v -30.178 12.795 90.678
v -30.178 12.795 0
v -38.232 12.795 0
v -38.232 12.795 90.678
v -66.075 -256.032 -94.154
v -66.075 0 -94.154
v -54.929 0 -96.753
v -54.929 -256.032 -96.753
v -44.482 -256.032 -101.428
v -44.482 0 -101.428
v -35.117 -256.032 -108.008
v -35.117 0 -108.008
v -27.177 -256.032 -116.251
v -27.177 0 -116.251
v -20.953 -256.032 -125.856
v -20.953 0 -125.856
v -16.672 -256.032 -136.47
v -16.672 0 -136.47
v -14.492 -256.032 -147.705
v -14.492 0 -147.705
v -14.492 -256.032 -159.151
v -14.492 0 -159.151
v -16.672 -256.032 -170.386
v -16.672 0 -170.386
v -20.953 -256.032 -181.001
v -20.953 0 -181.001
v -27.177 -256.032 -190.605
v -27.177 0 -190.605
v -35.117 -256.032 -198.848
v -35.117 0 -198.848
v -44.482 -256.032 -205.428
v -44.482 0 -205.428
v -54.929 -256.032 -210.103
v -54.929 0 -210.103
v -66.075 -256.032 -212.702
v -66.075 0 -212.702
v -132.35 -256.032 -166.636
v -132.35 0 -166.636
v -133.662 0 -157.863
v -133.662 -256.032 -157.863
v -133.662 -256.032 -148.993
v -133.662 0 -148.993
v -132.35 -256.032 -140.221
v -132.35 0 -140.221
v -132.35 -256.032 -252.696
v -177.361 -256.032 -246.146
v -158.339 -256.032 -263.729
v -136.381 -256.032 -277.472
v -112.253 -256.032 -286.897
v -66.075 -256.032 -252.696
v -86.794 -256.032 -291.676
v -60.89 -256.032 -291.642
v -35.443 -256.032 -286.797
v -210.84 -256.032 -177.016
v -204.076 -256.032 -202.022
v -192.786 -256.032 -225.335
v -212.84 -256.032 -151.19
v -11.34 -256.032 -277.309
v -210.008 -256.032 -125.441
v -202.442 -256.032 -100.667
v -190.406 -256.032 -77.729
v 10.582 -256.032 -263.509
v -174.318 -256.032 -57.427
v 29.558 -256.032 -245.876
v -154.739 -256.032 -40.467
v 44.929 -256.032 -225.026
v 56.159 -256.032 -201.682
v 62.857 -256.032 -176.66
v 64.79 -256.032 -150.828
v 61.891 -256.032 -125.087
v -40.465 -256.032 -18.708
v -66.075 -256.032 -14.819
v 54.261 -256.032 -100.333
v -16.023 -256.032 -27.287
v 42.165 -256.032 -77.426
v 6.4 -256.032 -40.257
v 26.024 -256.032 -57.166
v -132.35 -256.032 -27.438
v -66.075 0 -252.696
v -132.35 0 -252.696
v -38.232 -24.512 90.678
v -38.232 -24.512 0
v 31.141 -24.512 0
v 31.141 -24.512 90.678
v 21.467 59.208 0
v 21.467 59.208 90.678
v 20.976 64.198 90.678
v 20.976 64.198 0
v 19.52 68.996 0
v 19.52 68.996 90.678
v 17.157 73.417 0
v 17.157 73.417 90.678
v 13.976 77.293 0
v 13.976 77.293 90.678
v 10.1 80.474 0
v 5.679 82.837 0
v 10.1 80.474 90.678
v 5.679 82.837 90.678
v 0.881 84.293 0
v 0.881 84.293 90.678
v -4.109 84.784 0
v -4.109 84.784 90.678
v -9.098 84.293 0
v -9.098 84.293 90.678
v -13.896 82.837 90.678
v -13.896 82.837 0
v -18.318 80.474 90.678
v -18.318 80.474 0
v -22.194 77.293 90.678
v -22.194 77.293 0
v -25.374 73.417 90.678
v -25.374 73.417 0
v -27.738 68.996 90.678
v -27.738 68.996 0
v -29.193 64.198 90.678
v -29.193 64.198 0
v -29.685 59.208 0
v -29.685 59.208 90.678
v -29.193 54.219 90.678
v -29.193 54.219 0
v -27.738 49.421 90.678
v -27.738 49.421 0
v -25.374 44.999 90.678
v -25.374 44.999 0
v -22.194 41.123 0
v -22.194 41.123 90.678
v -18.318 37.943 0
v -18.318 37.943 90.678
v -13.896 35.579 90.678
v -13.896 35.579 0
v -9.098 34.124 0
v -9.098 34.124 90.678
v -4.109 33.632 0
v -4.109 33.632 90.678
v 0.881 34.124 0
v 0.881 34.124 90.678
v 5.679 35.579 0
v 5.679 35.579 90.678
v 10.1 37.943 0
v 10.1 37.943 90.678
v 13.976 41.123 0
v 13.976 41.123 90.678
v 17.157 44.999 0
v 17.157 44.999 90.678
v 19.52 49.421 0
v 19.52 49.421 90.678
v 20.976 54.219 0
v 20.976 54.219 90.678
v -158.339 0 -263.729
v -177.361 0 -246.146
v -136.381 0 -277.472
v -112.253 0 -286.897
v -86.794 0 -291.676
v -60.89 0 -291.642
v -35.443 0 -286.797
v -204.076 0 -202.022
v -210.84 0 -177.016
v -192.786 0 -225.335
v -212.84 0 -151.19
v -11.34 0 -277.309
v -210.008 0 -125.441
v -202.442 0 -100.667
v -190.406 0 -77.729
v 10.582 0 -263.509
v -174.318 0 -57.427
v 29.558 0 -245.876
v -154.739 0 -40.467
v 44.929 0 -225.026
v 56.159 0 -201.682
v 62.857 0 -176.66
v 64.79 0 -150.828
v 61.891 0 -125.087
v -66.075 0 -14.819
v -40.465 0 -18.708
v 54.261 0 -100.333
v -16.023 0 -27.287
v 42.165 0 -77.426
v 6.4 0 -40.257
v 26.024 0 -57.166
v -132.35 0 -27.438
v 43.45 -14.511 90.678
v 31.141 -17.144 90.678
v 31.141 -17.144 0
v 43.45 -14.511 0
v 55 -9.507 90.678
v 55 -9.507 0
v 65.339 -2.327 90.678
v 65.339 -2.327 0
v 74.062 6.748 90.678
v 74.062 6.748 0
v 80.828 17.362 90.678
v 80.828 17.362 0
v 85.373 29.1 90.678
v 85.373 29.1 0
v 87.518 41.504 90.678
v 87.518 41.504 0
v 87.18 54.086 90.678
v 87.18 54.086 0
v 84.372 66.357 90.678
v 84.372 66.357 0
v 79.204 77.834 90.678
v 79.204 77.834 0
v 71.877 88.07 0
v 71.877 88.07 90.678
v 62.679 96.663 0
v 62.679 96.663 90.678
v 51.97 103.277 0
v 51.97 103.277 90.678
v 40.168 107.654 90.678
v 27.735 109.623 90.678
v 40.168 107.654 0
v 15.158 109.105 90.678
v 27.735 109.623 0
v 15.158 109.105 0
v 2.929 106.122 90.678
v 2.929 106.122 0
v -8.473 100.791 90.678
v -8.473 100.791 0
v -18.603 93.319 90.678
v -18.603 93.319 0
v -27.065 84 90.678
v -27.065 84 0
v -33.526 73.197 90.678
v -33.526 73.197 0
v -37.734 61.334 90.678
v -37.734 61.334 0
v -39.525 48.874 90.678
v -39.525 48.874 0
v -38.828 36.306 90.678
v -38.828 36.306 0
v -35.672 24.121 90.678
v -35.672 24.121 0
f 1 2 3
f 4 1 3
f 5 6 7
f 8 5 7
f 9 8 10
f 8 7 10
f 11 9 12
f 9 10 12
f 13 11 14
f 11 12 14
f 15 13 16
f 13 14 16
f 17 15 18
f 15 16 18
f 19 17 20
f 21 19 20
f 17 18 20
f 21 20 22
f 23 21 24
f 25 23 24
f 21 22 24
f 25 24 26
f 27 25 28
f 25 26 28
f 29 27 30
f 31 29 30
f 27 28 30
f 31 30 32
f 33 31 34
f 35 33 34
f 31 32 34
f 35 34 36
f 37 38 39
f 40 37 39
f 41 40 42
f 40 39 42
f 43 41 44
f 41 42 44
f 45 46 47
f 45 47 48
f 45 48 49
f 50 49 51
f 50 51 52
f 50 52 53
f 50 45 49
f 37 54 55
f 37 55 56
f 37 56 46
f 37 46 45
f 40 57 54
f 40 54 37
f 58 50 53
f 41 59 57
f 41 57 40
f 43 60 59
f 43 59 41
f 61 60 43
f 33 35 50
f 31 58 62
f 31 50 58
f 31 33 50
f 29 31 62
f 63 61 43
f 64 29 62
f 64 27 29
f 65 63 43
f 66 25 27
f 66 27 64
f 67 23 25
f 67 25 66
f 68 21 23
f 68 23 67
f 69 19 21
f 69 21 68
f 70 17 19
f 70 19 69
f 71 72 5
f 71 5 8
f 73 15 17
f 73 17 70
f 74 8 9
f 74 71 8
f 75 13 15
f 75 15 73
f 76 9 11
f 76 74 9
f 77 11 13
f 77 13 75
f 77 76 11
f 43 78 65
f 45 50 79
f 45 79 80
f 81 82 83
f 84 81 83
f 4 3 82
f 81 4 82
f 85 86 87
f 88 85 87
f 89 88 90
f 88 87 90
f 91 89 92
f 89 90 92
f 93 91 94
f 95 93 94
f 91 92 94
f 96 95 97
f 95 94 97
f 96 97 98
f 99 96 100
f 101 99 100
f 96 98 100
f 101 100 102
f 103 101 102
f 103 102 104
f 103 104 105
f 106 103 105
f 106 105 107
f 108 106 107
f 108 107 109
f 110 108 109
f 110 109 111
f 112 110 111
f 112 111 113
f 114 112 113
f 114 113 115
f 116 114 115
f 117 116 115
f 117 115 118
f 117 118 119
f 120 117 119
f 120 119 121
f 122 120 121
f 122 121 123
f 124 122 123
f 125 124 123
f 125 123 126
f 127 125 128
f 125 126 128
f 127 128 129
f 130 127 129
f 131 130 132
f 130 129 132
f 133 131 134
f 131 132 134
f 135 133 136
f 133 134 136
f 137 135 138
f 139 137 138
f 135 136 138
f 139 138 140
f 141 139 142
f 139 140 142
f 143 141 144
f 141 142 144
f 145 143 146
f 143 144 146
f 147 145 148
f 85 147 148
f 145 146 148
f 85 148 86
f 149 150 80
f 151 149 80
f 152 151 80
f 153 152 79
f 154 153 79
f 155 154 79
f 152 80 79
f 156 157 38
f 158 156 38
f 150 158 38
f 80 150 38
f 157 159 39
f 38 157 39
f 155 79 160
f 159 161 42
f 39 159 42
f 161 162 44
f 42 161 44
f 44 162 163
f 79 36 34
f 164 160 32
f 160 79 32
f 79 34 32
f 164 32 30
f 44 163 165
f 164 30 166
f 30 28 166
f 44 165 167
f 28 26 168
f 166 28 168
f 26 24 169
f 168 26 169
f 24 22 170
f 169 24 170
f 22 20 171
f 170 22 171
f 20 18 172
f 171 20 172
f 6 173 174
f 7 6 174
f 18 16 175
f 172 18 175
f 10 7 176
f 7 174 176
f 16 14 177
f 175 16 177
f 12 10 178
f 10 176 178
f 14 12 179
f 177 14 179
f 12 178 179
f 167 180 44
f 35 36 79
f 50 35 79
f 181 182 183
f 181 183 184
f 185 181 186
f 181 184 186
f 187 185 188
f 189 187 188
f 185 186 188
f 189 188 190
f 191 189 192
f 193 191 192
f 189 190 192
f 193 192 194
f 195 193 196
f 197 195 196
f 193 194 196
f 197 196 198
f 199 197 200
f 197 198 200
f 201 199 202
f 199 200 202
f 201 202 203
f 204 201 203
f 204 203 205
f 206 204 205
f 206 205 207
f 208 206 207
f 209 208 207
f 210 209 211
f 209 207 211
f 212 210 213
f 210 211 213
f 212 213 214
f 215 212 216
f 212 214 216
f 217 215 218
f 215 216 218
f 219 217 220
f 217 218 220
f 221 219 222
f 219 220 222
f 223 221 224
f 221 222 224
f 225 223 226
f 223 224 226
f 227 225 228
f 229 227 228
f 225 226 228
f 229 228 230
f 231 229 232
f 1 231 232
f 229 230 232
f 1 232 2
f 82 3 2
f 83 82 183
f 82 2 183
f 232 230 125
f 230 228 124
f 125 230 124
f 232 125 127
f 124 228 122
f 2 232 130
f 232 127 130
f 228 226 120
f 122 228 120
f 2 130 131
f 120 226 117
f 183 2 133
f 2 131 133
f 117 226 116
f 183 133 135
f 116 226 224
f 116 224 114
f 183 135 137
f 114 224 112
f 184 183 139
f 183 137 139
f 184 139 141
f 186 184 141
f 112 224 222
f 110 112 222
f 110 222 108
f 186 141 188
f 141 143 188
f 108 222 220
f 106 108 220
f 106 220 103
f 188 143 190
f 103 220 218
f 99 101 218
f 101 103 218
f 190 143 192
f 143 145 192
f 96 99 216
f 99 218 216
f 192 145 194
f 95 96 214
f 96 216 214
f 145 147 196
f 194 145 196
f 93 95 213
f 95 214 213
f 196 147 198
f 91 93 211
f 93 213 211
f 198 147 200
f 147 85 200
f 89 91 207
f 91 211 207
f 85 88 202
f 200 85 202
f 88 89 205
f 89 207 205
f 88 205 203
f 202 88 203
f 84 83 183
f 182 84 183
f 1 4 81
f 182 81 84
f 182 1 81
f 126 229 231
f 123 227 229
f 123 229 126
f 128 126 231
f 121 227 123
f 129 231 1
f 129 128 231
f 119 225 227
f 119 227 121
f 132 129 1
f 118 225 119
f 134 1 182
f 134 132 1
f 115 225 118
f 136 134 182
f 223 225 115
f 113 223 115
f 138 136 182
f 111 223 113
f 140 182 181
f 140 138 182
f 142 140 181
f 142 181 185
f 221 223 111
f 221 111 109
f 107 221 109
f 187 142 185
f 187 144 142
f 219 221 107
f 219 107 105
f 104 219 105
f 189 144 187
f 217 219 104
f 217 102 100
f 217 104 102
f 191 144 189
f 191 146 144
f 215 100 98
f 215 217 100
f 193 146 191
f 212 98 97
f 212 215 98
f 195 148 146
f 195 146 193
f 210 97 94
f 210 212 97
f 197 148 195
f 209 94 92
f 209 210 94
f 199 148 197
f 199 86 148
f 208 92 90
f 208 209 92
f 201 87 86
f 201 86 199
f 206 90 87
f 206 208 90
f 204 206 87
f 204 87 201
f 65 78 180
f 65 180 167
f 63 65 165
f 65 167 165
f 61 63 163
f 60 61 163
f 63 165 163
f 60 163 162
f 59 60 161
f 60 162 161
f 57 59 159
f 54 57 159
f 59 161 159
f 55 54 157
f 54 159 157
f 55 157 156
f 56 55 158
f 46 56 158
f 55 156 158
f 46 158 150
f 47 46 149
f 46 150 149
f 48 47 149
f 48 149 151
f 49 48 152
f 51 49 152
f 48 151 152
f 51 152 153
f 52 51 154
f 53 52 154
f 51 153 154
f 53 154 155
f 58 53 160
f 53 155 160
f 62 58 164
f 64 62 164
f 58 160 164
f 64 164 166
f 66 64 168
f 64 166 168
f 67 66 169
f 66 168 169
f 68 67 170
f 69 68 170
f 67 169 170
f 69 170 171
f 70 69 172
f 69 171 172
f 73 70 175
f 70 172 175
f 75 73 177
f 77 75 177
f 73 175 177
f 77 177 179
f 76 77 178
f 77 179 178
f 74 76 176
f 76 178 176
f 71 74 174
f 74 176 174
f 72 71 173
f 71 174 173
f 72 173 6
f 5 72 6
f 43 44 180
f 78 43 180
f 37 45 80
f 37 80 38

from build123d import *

# Parameters (mm, degrees)
F1_DEPTH = 90.678
F2_R     = 25.5758086302
F3_DEPTH = 141.732
F5_DEPTH = 256.032


# Not quite as in the source:
# - the program builds the solid bodies; features that only make, move or delete a surface that nothing else refers to are left out


with BuildPart() as f1:
    # F0 (on Top) → F1 (new body)
    with BuildSketch(Plane.XY):
        with BuildLine():
            Line((-30.178046057, 12.7954334021), (-38.2321402431, 12.7954334021))
            Line((-38.2321402431, 12.7954334021), (-38.2321402431, -24.5117340237))
            Line((-38.2321402431, -24.5117340237), (31.1406925321, -24.5117340237))
            Line((31.1406925321, -24.5117340237), (31.1406925321, -17.1442935736))
            ThreePointArc((31.1406925321, -17.1442935736), (-3.8710651375, -11.08843806), (-30.178046057, 12.7954334021))
        make_face()
        with BuildLine():
            ThreePointArc((87.6843044367, 46.0943952203), (6.7480431649, 107.3323624507), (-30.178046057, 12.7954334021))
            Line((-30.178046057, 12.7954334021), (31.1406925321, 12.7954334021))
            Line((31.1406925321, 12.7954334021), (31.1406925321, -17.1442935736))
            ThreePointArc((31.1406925321, -17.1442935736), (71.4870223798, 3.6788561821), (87.6843044367, 46.0943952203))
        make_face()
        with BuildLine():
            Line((31.1406925321, 12.7954334021), (-30.178046057, 12.7954334021))
            ThreePointArc((-30.178046057, 12.7954334021), (-3.8710651375, -11.08843806), (31.1406925321, -17.1442935736))
            Line((31.1406925321, -17.1442935736), (31.1406925321, 12.7954334021))
        make_face()
    extrude(amount=F1_DEPTH)

    # F2 (on face) → F3 (cut)
    with BuildSketch(Plane.XY.offset(90.678)):
        with Locations((-4.1088564321, 59.2082738876)):
            Circle(F2_R)
    extrude(amount=-F3_DEPTH, mode=Mode.SUBTRACT)


with BuildPart() as f5:
    # F4 (on Front) → F5 (new body)
    with BuildSketch(Plane.XZ):
        with BuildLine():
            ThreePointArc((64.8145101963, -153.4280627966), (26.9208728789, -58.1070194145), (-66.0748556256, -14.819335941))
            Line((-66.0748556256, -14.819335941), (-66.0748556256, -94.1540102087))
            ThreePointArc((-66.0748556256, -94.1540102087), (-29.0116634578, -114.0497511318), (-14.2174317784, -153.4280627966))
            ThreePointArc((-14.2174317784, -153.4280627966), (-29.0116634578, -192.8063744613), (-66.0748556256, -212.7021153845))
            Line((-66.0748556256, -212.7021153845), (-66.0748556256, -252.6962310076))
            Line((-66.0748556256, -252.6962310076), (-132.3496177793, -252.6962310076))
            Line((-132.3496177793, -252.6962310076), (-132.3496177793, -166.6355990123))
            ThreePointArc((-132.3496177793, -166.6355990123), (-133.8262603336, -153.4280627966), (-132.3496177793, -140.2205265809))
            Line((-132.3496177793, -140.2205265809), (-132.3496177793, -27.4383613793))
            ThreePointArc((-132.3496177793, -27.4383613793), (-148.7798507212, -270.4185519652), (64.8145101963, -153.4280627966))
        make_face()
    extrude(amount=F5_DEPTH)


solid = Compound([f1.part, f5.part])
